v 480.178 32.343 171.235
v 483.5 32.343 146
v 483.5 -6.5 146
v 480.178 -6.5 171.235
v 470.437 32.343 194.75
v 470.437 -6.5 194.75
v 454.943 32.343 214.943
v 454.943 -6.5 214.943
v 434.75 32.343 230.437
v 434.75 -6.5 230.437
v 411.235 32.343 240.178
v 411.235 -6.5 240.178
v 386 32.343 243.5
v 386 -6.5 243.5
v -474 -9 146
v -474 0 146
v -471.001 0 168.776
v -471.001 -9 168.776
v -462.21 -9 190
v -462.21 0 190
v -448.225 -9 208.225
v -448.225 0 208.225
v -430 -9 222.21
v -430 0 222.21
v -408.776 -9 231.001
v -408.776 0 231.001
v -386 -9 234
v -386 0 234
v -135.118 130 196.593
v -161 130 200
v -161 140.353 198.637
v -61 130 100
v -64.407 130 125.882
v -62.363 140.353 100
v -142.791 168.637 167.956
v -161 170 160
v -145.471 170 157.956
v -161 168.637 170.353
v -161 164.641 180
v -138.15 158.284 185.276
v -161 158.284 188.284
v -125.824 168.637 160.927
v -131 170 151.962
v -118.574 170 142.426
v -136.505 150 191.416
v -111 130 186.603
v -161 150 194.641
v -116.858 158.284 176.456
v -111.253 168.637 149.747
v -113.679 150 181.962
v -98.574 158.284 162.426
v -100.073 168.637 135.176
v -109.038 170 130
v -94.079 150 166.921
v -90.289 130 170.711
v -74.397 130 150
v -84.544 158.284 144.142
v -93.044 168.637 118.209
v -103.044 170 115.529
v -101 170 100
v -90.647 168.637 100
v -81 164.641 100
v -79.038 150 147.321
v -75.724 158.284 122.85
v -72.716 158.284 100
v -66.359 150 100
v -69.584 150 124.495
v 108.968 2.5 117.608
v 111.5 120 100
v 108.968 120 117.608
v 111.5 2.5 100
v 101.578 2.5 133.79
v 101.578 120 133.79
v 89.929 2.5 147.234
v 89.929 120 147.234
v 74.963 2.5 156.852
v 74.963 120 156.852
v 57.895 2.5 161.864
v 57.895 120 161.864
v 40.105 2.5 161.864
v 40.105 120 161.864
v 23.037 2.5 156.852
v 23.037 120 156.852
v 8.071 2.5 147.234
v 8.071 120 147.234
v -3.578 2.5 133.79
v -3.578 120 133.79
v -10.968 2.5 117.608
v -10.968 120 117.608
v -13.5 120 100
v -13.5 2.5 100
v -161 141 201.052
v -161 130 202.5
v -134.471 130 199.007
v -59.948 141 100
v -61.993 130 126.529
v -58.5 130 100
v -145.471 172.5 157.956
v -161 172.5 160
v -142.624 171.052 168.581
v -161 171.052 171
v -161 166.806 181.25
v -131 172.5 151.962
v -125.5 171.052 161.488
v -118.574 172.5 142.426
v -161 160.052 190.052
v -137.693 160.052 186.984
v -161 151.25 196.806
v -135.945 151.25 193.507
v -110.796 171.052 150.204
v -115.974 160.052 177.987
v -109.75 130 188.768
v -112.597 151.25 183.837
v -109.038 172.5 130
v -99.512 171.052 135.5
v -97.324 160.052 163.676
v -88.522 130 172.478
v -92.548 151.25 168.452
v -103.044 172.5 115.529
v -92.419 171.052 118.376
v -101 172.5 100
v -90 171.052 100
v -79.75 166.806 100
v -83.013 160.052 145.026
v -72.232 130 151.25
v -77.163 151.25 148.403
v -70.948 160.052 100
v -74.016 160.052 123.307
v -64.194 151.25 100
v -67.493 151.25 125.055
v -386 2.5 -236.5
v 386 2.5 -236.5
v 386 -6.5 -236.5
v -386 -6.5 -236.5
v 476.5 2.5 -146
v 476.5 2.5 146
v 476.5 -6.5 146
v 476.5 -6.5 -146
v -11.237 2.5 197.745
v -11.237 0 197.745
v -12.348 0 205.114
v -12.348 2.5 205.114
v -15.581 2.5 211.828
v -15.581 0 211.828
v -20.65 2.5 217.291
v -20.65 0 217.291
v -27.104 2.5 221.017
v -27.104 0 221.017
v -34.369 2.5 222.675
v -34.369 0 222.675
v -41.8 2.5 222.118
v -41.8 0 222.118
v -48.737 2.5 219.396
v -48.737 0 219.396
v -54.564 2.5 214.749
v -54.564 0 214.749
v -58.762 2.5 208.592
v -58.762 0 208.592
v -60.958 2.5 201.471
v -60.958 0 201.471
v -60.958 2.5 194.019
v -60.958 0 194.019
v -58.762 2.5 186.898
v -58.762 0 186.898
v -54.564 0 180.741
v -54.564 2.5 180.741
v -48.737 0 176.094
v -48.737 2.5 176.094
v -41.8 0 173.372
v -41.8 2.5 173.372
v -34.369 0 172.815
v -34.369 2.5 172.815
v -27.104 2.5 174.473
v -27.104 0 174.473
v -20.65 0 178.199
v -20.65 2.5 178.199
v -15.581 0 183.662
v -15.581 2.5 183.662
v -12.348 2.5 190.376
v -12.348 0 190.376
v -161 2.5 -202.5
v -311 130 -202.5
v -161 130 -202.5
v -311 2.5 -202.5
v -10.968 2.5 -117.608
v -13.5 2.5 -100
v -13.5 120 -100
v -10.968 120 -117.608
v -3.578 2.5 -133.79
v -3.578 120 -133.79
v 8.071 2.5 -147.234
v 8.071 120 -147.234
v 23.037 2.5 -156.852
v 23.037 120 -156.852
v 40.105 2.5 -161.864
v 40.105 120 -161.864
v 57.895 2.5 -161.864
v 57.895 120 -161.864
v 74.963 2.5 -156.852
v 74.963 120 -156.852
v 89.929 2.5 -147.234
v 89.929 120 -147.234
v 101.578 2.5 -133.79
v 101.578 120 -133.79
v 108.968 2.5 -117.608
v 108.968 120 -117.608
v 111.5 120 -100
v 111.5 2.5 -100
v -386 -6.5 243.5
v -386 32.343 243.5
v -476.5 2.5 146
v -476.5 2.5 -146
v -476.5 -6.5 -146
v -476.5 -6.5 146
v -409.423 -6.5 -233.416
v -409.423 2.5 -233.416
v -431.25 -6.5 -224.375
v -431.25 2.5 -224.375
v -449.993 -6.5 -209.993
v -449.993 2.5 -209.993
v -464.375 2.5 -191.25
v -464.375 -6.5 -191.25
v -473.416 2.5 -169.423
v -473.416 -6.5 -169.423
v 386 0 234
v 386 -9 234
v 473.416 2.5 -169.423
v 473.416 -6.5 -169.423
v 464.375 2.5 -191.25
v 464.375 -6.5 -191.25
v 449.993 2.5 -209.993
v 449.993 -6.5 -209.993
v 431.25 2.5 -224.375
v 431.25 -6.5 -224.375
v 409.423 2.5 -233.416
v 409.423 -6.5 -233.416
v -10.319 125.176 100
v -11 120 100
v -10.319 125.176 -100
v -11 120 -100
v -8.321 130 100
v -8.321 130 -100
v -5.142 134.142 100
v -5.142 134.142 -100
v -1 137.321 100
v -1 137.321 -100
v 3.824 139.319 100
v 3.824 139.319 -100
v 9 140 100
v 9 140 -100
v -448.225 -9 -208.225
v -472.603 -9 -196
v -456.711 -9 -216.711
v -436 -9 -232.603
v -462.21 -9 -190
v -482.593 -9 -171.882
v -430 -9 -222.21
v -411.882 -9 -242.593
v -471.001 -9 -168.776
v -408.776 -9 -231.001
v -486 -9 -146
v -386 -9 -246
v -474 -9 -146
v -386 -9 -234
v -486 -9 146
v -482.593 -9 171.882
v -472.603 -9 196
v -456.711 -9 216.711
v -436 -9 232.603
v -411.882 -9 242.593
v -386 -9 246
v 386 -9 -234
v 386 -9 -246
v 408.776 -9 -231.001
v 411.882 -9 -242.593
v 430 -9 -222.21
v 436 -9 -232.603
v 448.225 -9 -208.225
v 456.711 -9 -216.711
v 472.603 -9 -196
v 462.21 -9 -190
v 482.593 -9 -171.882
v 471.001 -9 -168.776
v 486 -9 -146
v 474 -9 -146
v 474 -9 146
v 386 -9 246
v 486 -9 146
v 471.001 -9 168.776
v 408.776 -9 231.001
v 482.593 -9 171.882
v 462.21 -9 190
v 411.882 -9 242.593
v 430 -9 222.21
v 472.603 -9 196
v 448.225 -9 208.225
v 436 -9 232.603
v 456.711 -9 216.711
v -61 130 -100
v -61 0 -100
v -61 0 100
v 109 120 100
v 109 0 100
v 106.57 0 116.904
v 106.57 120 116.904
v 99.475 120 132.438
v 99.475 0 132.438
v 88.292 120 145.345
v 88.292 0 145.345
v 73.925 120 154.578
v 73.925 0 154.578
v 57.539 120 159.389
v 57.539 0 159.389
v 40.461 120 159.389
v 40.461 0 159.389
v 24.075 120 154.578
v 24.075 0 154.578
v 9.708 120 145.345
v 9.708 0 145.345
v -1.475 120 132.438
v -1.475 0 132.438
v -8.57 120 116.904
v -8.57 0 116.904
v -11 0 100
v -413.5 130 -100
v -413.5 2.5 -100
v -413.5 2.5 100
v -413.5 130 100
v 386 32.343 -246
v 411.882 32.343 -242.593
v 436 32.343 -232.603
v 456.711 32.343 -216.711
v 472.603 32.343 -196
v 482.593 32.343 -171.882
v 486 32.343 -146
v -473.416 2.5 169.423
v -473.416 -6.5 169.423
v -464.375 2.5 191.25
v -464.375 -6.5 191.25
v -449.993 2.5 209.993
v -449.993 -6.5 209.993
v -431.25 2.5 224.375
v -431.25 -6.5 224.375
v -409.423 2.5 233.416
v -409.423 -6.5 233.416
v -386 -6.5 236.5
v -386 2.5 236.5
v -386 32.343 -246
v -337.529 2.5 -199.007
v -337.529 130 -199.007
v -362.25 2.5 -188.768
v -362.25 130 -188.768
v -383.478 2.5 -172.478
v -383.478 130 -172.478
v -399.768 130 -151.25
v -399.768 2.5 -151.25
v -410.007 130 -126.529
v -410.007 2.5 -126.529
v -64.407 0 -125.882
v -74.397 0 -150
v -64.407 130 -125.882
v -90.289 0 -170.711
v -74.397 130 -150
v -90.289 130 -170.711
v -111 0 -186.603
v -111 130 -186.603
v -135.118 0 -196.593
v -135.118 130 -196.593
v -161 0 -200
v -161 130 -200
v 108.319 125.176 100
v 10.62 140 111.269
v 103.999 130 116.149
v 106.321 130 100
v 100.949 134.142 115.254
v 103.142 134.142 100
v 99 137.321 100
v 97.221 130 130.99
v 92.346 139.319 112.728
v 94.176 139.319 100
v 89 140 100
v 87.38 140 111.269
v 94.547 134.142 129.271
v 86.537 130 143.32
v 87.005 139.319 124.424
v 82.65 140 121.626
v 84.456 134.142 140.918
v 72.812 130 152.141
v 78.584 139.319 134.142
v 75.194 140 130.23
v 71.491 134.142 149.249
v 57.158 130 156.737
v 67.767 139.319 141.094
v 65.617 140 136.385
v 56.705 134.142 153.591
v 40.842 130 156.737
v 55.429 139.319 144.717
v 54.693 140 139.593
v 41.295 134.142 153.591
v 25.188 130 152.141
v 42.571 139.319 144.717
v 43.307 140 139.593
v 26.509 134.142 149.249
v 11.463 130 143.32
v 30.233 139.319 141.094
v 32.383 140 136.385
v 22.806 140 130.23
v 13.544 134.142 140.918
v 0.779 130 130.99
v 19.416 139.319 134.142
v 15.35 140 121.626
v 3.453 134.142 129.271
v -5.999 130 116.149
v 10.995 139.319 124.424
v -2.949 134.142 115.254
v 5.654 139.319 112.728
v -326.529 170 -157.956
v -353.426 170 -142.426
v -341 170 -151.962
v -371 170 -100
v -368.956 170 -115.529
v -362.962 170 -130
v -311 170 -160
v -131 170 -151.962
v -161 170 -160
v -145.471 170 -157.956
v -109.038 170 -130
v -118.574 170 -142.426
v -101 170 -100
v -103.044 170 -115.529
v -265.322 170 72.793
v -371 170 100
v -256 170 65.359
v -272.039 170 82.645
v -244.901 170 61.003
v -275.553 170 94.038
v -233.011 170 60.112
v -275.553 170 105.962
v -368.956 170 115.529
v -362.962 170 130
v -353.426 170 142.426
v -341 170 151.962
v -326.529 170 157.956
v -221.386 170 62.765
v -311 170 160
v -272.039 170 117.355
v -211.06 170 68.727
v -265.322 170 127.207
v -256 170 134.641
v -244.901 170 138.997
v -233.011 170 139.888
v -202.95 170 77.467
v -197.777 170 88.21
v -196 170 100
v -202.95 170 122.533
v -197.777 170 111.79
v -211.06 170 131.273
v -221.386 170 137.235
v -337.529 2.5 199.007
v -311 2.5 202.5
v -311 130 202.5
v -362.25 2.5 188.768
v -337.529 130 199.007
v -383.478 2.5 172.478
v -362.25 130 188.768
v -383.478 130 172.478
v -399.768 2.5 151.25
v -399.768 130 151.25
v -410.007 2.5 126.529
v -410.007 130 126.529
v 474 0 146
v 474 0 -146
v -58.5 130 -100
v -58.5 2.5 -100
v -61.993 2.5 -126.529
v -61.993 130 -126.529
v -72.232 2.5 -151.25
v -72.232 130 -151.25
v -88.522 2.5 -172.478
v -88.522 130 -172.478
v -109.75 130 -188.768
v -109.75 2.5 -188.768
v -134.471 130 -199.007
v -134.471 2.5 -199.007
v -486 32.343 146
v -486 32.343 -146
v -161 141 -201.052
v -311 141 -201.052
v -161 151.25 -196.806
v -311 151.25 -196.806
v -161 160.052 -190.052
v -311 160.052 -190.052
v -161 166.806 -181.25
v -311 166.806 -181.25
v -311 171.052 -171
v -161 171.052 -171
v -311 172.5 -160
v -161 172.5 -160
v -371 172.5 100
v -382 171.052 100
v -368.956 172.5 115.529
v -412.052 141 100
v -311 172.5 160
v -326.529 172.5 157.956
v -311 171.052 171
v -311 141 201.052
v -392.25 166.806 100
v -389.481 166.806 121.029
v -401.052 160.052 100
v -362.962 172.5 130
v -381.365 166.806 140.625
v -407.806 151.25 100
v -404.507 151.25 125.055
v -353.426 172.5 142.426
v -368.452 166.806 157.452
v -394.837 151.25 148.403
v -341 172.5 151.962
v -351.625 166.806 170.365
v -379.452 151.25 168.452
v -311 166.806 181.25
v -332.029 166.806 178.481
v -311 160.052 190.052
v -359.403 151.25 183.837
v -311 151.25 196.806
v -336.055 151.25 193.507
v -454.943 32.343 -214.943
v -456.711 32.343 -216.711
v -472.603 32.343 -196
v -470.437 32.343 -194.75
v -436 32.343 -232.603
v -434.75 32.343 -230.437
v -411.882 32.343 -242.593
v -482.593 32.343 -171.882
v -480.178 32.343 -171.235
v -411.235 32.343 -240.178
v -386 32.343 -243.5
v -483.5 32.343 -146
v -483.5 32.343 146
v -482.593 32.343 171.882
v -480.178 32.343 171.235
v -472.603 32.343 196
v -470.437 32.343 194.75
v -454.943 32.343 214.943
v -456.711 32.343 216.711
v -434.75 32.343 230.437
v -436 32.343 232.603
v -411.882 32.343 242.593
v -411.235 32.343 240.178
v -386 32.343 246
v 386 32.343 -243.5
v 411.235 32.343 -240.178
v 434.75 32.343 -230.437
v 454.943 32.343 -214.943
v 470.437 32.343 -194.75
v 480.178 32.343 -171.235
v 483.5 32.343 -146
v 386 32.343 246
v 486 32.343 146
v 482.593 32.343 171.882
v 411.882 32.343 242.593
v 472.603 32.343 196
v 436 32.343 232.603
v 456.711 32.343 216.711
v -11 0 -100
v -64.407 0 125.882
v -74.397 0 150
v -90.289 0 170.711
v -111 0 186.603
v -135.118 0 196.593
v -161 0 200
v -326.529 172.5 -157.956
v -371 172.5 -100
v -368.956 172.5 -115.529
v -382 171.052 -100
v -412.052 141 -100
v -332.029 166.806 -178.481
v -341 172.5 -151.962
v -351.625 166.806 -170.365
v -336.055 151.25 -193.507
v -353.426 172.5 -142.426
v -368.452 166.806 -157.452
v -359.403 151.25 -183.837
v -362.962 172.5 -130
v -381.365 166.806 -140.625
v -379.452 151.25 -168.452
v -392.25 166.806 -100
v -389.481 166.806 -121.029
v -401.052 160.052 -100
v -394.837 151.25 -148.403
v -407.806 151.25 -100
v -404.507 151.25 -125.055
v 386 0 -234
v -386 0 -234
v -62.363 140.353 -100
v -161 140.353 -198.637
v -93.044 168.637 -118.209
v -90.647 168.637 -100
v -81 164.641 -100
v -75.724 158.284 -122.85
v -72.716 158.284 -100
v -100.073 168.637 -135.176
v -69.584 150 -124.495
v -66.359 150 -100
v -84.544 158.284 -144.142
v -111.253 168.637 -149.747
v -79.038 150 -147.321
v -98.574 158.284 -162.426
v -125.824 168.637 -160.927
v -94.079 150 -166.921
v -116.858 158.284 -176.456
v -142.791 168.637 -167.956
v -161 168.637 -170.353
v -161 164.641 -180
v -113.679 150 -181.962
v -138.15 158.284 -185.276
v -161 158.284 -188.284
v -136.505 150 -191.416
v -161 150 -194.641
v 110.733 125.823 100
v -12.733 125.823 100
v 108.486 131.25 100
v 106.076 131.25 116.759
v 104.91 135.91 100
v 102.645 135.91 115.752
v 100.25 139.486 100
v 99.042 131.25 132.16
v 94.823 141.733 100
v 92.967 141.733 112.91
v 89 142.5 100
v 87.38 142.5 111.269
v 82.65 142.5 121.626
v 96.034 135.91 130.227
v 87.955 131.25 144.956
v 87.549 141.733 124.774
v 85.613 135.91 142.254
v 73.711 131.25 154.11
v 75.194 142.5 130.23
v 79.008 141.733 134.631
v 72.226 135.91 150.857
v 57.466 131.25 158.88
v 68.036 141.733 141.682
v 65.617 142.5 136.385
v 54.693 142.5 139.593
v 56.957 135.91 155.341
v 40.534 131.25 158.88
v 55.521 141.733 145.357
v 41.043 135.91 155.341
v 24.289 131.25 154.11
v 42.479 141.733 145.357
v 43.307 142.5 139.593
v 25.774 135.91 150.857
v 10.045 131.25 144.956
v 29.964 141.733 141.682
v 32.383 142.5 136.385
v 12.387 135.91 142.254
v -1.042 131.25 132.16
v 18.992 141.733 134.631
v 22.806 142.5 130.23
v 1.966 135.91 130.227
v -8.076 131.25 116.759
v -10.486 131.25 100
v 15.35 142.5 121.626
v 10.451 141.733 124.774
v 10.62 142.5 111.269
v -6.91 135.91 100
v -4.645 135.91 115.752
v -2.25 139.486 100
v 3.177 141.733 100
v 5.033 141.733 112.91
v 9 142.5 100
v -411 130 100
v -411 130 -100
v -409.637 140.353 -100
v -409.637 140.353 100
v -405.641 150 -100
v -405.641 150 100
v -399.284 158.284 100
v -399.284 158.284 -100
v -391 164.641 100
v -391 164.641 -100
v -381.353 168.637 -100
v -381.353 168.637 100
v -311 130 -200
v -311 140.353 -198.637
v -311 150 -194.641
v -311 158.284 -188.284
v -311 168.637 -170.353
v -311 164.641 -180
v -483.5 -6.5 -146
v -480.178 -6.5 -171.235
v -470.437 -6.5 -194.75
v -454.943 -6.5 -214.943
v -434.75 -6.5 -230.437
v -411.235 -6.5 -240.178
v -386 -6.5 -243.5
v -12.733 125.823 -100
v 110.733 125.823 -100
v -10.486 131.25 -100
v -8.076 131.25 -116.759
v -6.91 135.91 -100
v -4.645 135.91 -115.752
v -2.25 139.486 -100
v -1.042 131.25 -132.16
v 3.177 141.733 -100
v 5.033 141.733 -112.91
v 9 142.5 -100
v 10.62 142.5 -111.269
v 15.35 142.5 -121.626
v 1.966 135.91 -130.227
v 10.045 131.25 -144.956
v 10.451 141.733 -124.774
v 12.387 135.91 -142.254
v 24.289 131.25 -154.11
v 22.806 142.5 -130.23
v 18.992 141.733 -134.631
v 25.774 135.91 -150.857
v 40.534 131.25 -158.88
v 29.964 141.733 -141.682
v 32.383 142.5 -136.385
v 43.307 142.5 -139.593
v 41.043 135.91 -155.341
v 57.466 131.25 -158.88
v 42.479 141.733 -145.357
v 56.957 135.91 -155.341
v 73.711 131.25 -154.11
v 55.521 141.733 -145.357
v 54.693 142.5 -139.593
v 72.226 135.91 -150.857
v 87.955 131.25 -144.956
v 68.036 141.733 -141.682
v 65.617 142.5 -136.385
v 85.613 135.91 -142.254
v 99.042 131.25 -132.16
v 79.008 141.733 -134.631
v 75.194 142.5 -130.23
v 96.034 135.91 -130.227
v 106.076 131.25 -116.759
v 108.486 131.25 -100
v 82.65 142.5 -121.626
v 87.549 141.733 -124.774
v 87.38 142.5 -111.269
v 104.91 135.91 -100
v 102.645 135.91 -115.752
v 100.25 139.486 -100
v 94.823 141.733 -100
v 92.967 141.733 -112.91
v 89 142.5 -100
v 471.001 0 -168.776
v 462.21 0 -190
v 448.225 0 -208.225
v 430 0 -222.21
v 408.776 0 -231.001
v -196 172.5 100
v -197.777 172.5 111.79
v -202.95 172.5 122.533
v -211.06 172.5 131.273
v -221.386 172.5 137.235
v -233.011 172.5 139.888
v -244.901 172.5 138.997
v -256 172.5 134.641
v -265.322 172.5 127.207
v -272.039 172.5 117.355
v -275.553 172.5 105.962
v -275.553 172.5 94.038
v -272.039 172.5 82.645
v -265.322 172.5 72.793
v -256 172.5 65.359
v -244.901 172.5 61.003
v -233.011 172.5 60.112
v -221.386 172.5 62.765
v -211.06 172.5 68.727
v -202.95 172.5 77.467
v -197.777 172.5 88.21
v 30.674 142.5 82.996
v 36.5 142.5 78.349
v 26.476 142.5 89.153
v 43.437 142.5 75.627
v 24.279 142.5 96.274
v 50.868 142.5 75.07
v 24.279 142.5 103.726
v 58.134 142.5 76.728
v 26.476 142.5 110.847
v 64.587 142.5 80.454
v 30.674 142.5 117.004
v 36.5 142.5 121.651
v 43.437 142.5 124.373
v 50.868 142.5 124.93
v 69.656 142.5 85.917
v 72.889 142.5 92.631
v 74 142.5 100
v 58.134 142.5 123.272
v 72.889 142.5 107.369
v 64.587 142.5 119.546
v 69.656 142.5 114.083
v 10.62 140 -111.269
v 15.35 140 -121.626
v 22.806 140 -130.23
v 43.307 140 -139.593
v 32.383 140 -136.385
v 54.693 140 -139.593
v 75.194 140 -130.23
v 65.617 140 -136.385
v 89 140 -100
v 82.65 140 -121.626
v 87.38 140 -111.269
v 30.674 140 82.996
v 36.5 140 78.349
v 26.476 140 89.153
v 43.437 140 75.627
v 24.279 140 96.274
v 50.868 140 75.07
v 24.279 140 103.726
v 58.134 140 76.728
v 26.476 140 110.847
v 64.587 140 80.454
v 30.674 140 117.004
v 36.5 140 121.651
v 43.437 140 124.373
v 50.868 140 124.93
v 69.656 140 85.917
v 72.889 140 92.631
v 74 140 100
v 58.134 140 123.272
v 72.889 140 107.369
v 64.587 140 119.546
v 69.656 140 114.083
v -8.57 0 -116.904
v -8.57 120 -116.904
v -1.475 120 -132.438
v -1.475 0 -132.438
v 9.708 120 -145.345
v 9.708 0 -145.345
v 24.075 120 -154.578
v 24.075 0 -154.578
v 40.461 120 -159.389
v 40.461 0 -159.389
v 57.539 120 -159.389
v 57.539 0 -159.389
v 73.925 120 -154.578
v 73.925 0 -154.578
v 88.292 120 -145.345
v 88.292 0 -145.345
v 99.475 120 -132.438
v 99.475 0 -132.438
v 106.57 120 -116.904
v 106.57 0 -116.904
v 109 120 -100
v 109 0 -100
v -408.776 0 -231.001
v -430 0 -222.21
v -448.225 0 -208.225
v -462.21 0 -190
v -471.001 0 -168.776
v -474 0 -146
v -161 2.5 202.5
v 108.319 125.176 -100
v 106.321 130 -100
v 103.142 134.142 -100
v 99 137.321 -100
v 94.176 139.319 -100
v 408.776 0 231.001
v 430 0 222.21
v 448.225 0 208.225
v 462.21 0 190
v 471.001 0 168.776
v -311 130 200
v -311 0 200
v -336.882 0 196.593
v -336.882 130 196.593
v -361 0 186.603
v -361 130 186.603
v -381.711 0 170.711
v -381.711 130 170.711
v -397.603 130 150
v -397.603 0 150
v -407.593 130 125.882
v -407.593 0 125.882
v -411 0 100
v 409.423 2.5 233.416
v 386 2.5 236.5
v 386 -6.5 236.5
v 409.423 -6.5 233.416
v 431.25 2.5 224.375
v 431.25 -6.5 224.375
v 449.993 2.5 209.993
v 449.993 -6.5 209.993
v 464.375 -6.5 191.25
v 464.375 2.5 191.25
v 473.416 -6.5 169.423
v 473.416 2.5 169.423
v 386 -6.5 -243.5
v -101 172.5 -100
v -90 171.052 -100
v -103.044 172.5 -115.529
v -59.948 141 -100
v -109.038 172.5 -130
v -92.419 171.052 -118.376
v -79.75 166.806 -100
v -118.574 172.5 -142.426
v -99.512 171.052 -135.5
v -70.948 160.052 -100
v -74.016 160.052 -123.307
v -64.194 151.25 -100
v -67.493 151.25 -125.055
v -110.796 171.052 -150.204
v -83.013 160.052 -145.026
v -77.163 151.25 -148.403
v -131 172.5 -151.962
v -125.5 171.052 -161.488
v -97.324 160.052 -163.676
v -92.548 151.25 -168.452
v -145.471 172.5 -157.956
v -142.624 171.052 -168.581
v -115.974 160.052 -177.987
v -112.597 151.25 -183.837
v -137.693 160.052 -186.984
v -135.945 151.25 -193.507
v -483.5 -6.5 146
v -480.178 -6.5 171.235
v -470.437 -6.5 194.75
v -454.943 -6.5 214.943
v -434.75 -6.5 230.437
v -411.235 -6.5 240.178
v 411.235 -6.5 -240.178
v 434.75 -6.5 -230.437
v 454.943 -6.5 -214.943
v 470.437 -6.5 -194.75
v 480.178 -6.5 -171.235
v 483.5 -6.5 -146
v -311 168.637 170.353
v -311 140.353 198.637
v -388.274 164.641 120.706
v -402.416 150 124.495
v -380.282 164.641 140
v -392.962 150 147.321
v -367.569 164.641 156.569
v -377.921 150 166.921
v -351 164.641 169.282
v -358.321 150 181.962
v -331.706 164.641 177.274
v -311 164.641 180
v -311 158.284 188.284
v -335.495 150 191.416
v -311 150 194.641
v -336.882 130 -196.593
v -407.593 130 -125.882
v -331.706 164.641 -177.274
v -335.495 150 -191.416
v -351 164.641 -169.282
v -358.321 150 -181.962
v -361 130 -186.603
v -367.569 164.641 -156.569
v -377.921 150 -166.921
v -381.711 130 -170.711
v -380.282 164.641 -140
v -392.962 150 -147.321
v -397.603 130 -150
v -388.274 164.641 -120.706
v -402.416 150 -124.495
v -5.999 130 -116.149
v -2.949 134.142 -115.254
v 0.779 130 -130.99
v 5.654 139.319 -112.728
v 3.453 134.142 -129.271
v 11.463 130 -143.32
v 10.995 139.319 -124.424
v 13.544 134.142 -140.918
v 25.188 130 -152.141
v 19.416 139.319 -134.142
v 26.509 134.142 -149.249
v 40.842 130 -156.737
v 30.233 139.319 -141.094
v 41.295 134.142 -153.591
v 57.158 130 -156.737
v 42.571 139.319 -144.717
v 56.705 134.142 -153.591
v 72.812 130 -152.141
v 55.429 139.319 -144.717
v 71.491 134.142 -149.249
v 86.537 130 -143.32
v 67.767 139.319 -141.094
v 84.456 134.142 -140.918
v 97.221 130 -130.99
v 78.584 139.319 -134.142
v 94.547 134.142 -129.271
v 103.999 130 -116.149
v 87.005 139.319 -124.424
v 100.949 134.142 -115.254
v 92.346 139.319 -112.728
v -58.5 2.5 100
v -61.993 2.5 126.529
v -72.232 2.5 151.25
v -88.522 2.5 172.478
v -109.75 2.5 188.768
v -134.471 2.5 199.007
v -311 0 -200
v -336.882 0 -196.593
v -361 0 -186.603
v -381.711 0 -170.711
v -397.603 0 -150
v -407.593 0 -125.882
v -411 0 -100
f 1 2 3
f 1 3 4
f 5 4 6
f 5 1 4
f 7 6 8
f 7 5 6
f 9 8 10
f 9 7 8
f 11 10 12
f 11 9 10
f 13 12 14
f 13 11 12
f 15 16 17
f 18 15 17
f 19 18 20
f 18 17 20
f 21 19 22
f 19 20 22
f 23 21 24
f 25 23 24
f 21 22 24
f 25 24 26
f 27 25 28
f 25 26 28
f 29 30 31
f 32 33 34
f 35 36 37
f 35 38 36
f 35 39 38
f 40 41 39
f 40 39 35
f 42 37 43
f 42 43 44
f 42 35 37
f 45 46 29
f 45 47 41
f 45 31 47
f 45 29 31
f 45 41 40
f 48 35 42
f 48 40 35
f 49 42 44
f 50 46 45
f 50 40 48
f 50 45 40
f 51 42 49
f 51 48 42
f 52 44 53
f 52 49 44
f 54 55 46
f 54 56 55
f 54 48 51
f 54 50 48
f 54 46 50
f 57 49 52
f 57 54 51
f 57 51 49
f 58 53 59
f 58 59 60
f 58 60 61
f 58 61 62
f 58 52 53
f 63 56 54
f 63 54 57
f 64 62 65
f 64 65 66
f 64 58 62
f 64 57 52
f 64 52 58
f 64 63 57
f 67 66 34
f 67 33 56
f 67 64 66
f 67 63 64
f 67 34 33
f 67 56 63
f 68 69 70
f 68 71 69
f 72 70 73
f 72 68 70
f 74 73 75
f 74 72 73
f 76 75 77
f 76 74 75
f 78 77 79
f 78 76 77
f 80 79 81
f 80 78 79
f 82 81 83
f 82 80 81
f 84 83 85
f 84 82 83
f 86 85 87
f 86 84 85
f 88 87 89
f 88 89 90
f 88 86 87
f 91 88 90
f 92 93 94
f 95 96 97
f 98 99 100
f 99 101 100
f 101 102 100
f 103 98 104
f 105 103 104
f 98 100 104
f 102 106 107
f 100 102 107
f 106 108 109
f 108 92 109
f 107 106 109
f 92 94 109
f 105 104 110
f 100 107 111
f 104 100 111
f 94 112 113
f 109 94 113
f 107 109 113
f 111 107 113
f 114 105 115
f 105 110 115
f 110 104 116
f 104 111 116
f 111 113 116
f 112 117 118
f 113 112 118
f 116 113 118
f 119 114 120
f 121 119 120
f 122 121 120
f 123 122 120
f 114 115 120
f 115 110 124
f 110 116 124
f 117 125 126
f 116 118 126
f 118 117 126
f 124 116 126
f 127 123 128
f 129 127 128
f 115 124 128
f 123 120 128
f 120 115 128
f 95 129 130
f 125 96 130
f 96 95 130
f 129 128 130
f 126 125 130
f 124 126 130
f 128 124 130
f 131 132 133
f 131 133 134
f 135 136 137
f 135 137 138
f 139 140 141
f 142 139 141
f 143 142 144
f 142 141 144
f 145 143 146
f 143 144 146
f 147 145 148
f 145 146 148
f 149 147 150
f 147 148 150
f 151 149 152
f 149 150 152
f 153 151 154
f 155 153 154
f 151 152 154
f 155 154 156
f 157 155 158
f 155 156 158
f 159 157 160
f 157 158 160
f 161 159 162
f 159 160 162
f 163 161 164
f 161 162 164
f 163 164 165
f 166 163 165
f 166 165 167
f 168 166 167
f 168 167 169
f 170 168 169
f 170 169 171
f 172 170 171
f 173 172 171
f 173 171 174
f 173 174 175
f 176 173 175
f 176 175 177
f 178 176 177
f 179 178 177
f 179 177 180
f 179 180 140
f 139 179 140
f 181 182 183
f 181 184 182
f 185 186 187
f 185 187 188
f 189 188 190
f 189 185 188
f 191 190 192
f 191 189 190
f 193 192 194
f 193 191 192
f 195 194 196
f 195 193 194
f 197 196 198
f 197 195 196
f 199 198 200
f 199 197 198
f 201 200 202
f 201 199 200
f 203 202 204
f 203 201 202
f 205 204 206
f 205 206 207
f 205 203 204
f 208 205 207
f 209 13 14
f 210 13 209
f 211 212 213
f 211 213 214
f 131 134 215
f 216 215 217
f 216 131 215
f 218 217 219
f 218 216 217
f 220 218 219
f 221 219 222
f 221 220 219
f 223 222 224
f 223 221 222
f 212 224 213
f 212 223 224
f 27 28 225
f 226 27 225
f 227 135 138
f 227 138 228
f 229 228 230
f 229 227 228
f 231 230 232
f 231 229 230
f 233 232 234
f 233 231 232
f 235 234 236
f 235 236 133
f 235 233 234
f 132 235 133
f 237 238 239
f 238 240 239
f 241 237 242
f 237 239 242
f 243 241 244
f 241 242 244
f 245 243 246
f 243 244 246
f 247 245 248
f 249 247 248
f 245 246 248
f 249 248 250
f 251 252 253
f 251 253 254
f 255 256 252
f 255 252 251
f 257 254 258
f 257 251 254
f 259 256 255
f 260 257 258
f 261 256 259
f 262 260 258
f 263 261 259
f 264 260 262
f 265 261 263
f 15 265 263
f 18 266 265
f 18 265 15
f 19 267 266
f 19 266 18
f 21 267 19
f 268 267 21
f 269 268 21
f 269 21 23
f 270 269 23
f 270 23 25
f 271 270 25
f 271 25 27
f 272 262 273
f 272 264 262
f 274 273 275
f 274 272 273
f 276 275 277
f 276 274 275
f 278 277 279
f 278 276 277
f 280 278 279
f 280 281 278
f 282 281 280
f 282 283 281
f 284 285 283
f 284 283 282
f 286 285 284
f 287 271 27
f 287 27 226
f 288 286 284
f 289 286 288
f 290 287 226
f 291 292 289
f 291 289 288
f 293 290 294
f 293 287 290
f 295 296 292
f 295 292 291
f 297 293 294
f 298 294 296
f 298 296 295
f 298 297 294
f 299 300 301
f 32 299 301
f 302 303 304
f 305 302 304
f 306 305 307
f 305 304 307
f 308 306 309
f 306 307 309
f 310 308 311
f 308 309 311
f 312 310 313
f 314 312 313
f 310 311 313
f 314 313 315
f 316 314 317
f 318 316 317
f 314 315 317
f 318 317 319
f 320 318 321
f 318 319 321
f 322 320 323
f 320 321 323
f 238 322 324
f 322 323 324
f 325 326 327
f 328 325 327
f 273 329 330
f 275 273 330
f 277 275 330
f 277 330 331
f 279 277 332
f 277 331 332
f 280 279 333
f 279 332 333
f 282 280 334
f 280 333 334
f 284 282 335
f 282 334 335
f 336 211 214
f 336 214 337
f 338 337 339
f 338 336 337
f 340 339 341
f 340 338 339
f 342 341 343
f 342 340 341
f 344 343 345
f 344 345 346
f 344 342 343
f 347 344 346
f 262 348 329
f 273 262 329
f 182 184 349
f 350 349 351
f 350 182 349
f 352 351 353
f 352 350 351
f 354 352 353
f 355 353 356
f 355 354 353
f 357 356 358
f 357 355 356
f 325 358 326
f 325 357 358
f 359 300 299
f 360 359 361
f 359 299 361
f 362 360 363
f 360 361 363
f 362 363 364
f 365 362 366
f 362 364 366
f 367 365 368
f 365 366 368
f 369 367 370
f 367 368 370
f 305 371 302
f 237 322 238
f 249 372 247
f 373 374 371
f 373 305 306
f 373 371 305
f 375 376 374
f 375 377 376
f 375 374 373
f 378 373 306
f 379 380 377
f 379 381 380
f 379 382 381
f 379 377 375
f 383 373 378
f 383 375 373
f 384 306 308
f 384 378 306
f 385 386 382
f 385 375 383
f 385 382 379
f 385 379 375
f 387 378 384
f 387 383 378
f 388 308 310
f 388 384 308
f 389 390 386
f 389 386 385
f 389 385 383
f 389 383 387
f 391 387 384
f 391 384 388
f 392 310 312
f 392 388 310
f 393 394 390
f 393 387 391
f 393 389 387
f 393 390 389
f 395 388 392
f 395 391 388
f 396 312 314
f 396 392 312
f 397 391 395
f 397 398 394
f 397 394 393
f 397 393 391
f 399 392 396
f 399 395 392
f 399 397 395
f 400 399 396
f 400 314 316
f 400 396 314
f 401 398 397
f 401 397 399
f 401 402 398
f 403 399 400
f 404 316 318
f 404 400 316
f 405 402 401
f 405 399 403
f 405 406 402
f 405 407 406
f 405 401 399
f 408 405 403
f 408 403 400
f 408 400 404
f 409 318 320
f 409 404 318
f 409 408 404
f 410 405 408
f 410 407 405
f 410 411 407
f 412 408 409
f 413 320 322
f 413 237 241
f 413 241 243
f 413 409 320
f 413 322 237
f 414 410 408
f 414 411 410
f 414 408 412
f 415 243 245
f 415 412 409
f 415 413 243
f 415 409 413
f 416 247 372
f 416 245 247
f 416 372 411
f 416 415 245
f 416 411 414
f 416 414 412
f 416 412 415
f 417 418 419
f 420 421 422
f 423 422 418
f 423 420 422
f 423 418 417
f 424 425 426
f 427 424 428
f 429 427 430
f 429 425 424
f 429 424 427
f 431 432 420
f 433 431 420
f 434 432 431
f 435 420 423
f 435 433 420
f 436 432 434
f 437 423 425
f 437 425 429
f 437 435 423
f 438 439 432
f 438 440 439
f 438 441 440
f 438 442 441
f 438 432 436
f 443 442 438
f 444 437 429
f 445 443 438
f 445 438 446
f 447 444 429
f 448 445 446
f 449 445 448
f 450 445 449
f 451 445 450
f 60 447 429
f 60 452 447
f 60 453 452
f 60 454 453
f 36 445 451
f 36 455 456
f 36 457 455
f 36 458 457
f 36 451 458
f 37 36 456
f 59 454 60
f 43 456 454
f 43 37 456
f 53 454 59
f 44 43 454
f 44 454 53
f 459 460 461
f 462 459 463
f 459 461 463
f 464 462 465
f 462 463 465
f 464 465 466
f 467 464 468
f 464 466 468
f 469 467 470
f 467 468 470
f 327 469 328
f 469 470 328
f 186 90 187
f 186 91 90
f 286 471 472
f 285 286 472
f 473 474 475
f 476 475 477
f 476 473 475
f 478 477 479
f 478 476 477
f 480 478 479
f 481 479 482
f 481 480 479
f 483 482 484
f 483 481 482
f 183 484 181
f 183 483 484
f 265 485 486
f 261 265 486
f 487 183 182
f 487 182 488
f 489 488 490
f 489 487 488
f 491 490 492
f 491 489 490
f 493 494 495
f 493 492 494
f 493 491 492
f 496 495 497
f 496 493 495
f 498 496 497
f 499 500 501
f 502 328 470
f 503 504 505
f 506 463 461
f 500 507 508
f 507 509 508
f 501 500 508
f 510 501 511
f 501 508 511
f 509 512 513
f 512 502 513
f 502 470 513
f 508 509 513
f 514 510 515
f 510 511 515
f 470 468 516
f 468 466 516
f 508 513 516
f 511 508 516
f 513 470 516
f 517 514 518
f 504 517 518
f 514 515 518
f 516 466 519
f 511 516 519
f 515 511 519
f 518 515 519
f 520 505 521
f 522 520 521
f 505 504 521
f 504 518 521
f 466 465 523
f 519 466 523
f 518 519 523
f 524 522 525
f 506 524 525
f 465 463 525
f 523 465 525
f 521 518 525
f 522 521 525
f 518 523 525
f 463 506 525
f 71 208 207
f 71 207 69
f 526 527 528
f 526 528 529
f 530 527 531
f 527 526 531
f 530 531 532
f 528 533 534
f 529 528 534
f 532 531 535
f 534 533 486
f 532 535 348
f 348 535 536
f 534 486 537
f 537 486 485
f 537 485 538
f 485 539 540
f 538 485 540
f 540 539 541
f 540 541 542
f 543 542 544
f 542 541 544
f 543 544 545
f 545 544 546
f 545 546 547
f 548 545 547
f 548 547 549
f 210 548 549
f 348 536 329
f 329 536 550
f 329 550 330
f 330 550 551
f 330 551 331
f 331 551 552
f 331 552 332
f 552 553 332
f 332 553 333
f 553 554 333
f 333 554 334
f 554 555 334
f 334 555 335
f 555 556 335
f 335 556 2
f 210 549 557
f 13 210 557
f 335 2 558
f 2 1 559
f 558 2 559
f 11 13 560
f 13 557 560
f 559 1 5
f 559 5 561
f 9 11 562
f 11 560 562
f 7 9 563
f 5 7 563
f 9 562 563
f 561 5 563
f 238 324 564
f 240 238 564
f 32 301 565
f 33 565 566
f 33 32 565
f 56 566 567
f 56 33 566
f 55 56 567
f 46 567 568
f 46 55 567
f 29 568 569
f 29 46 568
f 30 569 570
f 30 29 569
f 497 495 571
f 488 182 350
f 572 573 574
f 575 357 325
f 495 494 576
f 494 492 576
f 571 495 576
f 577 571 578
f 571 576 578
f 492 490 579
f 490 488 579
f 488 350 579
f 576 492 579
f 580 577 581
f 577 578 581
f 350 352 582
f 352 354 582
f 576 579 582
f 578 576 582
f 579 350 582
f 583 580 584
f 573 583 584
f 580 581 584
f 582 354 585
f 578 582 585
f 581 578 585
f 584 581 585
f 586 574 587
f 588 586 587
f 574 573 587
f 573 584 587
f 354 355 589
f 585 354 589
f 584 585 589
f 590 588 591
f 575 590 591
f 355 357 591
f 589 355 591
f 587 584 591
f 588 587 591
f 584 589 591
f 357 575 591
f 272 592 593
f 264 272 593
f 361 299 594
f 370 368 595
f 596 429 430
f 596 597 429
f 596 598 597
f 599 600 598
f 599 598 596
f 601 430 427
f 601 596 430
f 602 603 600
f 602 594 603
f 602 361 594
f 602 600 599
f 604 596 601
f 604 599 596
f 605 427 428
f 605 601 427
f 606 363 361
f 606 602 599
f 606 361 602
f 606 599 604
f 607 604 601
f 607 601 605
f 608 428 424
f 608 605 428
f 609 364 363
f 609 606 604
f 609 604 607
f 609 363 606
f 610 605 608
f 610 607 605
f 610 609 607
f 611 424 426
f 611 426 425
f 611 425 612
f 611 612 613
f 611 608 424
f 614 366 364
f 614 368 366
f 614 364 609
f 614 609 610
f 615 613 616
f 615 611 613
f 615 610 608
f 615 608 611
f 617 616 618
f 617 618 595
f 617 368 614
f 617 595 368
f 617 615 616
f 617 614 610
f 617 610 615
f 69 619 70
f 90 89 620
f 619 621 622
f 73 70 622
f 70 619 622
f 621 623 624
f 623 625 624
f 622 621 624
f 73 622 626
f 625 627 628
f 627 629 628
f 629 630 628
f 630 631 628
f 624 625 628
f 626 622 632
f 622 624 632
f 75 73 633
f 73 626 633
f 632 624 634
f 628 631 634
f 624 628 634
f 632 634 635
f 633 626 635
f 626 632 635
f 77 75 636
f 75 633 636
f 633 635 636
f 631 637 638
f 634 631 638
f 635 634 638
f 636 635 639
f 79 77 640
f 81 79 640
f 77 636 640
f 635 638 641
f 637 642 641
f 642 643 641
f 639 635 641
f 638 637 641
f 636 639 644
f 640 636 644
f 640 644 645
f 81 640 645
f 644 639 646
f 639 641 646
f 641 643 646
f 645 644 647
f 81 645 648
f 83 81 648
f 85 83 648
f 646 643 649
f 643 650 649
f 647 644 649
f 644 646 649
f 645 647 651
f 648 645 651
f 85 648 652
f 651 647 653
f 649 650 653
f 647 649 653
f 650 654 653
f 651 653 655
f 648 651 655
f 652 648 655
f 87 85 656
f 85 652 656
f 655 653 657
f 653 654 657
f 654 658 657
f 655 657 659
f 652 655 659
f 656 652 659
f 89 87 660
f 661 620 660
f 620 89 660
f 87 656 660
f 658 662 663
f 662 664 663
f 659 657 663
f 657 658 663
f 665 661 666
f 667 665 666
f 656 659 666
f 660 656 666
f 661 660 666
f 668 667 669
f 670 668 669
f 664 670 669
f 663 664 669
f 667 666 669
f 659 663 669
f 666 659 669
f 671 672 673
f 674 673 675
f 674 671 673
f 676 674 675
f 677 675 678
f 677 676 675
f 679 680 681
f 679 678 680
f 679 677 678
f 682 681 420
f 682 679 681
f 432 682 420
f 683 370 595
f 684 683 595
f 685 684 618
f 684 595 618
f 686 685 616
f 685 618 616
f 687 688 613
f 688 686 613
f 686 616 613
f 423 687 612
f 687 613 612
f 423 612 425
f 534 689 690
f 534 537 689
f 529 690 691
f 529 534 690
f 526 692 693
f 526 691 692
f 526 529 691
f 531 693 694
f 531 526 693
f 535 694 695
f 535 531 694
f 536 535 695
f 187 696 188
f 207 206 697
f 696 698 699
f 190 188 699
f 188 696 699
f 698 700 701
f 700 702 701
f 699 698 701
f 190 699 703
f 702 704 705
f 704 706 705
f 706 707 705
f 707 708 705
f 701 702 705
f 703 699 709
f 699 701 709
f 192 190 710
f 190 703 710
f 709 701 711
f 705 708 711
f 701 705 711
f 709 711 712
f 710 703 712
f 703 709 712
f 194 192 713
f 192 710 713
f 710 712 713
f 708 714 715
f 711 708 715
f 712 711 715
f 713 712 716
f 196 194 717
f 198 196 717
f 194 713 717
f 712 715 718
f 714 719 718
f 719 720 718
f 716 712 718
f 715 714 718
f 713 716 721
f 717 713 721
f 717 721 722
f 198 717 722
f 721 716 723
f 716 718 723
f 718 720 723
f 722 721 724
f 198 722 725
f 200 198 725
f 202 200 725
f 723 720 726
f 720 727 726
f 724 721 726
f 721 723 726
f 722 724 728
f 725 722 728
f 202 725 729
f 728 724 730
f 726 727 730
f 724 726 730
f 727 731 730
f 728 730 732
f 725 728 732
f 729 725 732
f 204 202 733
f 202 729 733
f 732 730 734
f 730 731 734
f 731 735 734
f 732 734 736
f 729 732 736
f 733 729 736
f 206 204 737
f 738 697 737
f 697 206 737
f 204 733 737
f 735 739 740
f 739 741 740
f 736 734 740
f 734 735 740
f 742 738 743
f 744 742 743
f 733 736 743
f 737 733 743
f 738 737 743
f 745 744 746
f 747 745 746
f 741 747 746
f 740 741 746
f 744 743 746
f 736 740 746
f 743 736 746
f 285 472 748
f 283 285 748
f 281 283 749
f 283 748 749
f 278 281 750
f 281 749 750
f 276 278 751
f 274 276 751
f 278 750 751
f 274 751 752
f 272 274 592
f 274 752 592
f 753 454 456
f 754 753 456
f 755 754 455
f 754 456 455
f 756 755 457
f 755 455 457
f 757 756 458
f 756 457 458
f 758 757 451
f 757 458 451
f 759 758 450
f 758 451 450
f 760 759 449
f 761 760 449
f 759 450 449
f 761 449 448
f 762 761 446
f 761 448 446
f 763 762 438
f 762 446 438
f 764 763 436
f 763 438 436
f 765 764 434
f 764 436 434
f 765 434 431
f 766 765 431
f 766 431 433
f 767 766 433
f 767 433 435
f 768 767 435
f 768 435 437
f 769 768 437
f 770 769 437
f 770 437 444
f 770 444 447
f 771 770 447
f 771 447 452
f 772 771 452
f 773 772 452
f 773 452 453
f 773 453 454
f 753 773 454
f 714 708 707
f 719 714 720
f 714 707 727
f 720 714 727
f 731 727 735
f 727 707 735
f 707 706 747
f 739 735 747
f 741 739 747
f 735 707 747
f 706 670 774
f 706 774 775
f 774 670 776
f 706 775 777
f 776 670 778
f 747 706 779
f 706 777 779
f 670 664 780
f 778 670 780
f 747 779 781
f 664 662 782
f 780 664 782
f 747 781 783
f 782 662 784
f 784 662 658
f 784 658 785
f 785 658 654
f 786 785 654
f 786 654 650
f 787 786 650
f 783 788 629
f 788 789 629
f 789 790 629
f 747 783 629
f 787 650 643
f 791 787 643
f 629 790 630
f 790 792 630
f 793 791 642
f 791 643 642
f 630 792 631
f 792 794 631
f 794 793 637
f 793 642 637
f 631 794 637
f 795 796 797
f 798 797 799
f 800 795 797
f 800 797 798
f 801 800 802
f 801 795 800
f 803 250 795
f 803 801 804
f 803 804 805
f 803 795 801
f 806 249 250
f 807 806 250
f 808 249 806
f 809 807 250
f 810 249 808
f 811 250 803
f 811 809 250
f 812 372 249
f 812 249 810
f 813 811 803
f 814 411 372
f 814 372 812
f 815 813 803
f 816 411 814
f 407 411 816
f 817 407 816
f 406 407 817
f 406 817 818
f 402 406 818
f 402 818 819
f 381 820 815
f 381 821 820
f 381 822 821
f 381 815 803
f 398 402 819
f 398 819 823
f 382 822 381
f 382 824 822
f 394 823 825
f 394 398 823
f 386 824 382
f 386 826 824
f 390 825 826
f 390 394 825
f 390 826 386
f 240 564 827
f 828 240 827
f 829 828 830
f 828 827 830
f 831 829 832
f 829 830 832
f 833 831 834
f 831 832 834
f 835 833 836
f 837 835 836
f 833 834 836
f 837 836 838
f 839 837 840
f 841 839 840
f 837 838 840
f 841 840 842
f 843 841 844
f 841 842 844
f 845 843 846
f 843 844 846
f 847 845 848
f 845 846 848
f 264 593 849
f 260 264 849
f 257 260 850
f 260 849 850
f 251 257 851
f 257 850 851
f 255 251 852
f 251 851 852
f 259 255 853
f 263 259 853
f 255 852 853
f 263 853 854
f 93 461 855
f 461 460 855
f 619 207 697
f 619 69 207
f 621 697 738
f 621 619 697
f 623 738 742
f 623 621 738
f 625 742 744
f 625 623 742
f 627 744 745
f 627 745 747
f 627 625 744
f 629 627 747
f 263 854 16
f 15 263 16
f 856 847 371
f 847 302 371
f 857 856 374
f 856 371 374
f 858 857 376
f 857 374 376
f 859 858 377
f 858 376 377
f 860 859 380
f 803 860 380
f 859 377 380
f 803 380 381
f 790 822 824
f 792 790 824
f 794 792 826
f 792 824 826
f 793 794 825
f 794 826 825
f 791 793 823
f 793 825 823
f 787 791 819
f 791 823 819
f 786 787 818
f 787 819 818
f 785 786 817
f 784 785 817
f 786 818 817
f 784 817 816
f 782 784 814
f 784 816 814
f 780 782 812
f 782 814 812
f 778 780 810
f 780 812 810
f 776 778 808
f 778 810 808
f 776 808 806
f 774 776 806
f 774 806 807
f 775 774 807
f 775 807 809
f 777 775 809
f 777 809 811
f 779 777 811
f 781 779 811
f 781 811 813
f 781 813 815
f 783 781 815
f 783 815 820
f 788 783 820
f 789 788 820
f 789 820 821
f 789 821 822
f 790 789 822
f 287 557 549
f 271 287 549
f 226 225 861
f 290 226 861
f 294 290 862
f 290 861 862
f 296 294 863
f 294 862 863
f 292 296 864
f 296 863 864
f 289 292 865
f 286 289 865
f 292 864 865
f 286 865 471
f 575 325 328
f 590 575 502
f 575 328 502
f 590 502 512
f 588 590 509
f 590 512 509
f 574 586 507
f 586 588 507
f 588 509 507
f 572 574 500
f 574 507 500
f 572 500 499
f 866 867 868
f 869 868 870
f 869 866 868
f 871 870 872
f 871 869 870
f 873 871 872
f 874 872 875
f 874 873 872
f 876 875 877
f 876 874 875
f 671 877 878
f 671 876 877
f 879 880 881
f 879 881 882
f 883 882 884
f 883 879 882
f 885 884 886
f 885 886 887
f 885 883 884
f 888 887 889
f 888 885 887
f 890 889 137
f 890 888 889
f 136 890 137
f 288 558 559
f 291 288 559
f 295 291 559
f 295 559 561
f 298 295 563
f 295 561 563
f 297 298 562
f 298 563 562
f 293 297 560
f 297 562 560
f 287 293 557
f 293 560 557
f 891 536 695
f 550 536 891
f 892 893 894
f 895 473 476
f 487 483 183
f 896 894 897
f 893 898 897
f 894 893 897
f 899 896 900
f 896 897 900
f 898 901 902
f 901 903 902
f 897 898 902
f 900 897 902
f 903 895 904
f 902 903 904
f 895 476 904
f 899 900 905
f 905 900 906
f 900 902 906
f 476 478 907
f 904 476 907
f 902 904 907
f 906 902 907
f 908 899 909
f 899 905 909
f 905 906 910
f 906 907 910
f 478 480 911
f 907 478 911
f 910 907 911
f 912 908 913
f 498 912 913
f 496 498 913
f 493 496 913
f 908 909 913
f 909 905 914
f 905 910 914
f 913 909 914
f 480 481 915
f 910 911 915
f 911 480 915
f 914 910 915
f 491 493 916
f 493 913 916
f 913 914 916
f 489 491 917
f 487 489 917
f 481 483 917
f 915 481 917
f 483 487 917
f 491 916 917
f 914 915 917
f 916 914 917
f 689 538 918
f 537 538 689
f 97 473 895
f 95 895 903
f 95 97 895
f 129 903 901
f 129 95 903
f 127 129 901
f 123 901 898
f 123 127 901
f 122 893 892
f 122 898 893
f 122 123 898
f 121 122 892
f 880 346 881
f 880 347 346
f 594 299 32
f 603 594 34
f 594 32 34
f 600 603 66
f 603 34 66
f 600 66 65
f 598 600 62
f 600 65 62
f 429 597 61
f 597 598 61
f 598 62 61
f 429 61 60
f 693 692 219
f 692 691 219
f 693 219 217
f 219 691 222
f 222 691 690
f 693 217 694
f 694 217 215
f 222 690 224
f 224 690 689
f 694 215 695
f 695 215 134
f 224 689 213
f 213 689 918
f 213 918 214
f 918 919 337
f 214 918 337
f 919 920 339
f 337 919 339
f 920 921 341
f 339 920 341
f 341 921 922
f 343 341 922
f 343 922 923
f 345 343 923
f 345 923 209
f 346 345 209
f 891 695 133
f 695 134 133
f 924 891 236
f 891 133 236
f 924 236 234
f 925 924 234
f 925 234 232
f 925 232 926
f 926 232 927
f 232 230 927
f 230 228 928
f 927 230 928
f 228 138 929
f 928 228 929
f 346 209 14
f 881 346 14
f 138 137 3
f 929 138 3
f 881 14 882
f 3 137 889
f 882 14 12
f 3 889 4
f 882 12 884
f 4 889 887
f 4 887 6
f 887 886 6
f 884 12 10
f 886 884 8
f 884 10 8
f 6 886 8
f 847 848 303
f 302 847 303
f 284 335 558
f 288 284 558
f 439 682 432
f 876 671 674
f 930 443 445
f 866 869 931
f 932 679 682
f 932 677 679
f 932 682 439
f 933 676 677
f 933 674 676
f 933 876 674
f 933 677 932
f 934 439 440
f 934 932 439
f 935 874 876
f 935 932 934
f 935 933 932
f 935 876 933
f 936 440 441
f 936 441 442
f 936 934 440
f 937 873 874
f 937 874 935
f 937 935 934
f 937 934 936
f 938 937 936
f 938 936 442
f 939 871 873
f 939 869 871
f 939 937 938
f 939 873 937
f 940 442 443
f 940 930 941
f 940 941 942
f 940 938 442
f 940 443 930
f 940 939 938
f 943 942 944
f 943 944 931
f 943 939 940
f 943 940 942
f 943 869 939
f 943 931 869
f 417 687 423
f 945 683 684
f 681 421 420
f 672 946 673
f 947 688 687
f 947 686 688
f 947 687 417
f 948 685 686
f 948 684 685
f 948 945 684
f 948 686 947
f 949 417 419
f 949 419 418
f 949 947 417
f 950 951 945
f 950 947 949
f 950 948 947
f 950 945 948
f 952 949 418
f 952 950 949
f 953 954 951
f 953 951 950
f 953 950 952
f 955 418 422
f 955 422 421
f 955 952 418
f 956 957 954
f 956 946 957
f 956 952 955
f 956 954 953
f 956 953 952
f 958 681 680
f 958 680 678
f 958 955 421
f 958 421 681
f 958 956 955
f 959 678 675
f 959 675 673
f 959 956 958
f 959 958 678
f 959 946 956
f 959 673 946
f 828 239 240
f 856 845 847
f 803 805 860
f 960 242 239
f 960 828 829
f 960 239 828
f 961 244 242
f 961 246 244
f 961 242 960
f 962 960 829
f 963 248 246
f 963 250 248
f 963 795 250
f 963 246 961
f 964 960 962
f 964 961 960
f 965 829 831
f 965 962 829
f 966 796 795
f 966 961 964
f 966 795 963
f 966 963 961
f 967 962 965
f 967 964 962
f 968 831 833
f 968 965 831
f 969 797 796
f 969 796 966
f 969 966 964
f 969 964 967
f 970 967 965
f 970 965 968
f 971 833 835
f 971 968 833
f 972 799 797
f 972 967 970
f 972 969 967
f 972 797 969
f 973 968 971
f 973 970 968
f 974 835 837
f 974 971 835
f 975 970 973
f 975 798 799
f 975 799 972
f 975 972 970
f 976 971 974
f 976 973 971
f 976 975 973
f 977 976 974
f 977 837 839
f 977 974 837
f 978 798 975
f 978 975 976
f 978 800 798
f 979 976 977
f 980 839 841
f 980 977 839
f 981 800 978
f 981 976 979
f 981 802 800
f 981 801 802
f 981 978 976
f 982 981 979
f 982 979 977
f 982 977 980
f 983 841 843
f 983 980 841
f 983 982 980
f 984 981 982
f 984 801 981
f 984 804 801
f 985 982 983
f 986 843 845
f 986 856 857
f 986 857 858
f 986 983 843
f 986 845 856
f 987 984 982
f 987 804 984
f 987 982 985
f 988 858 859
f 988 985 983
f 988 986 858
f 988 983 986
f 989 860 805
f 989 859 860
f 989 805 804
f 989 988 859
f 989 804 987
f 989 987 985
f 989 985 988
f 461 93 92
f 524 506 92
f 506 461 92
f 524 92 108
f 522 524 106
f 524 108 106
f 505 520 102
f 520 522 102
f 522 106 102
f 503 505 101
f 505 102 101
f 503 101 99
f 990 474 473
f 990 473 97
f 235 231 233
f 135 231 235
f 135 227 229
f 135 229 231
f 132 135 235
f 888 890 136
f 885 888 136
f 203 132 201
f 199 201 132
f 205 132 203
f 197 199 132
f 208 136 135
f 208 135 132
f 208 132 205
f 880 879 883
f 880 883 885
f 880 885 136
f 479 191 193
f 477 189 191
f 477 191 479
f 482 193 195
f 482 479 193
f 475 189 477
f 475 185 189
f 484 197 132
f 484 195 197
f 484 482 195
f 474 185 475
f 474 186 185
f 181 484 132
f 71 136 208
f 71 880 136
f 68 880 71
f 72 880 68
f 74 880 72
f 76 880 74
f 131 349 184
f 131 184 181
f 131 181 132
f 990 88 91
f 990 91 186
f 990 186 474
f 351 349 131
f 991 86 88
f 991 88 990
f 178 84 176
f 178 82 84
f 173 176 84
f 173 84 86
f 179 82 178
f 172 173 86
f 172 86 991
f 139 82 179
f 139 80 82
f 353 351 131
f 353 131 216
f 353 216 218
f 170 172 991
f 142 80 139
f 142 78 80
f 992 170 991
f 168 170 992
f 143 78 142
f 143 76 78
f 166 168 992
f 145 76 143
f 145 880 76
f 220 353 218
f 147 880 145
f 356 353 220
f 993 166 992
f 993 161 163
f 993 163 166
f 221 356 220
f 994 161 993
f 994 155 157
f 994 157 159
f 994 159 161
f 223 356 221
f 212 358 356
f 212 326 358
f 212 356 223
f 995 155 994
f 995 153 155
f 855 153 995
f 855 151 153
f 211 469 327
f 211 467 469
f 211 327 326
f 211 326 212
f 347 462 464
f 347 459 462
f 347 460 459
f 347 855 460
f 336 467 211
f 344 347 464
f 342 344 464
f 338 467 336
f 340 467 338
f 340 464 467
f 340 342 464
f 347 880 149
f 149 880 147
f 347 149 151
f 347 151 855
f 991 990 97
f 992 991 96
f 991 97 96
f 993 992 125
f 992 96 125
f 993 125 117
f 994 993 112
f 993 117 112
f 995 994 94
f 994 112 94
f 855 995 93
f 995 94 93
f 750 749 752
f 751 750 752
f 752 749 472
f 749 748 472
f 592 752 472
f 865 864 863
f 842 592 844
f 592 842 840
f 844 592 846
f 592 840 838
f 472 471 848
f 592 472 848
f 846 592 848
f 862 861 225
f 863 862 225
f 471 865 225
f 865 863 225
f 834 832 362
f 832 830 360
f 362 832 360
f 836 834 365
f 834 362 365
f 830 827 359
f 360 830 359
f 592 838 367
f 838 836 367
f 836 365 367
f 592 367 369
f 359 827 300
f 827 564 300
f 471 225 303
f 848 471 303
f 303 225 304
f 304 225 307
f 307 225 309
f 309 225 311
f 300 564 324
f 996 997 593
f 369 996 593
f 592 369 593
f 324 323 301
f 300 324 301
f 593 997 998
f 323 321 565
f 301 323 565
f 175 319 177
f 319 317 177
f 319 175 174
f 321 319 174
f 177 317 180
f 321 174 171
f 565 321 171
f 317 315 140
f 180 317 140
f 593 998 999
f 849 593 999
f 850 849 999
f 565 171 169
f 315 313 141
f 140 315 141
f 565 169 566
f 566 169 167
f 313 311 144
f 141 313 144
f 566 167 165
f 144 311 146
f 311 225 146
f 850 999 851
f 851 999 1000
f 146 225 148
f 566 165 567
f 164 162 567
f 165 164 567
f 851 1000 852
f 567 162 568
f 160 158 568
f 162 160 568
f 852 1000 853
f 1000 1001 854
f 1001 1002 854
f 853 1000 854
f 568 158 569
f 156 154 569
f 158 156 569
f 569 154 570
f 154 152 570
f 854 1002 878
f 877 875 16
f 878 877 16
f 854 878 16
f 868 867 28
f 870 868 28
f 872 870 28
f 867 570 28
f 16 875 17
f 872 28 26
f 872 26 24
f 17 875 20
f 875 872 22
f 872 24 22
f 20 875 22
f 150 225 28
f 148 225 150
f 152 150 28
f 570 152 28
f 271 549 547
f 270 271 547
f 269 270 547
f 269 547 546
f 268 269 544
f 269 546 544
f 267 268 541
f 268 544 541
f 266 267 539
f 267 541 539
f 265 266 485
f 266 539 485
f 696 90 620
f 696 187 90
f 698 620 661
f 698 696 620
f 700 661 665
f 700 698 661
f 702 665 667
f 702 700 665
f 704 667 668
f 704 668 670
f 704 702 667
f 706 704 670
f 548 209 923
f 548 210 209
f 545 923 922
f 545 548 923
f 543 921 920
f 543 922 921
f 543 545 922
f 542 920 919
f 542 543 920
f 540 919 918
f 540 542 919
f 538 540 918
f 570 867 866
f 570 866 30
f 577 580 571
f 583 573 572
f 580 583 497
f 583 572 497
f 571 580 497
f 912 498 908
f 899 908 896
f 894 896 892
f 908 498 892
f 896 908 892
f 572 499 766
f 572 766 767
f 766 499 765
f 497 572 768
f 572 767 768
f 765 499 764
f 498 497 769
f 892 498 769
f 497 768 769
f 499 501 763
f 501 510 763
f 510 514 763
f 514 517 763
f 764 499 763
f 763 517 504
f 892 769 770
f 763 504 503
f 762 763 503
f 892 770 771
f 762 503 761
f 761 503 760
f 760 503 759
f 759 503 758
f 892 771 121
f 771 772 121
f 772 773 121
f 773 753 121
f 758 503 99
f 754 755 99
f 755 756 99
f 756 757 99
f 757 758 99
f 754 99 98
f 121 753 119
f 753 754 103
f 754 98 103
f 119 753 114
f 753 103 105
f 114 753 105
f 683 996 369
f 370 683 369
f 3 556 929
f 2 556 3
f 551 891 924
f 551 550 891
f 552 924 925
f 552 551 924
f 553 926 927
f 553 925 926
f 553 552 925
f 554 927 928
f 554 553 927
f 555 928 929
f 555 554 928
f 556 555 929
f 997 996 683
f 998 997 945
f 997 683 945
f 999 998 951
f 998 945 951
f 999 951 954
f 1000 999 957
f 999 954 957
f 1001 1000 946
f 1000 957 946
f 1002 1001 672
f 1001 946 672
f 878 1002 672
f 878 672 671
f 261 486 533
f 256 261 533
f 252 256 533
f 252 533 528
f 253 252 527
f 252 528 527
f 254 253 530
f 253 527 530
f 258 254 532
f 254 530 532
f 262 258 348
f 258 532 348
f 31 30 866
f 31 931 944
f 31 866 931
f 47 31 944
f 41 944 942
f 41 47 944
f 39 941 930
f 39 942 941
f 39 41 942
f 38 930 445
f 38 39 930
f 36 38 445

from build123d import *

# Parameters (mm, degrees)
F1_DEPTH     = 300
F2_W         = 350
F2_H         = 400
F3_DEPTH     = 170
F4_R         = 40
F5_T1_DEPTH  = 170
F5_T4_ANGLE  = 90
F5_T6_ANGLE  = 90
F5_T8_ANGLE  = 90
F5_T10_ANGLE = 90
F7_DEPTH     = 140
F8_R         = 20
F10_DEPTH    = 9
F11_T        = -2.5
F12_DEPTH    = 267.6571849734
F13_R        = 40
F14_DEPTH    = 2.501
F15_R        = 25
F16_DEPTH    = 32.501
F17_R        = 25
F18_DEPTH    = 172.501


# Not quite as in the source:
# - a fillet or chamfer that OpenCascade refuses, or shapes differently, is made with other operations: its cross-section is extruded or revolved along the edge and cut away or added


with BuildPart() as f1:
    # F0 (on Front) → F1 (new body)
    with BuildSketch(Plane.XZ):
        with BuildLine():
            Line((-386, -246), (386, -246))
            ThreePointArc((386, -246), (456.7106781187, -216.7106781187), (486, -146))
            Line((486, -146), (486, 146))
            ThreePointArc((486, 146), (456.7106781187, 216.7106781187), (386, 246))
            Line((386, 246), (-386, 246))
            ThreePointArc((-386, 246), (-456.7106781187, 216.7106781187), (-486, 146))
            Line((-486, 146), (-486, -146))
            ThreePointArc((-486, -146), (-456.7106781187, -216.7106781187), (-386, -246))
        make_face()
    extrude(amount=-F1_DEPTH)

    # F2 (on face) → F3 (cut)
    with BuildSketch(Plane.XZ):
        with Locations((-236, 0)):
            Rectangle(F2_W, F2_H)
    extrude(amount=-F3_DEPTH, mode=Mode.SUBTRACT)

    # F4
    f4_edges = [f1.edges().sort_by_distance(p)[0] for p in [
        (-61, 170, 0),
        (-236, 170, 200),
        (-411, 170, 0),
        (-236, 170, -200),
    ]]
    fillet(f4_edges, radius=F4_R)

    # F5: fillet of radius 100 on 4 edges, made by hand

    # F5_s2 → F5_t1 (join)
    with BuildSketch(Plane.XZ.offset(-170)):
        with BuildLine():
            ThreePointArc((-311, 200), (-381.7106781187, 170.7106781187), (-411, 100))
            Line((-411, 100), (-411, 200))
            Line((-411, 200), (-311, 200))
        make_face()
        with BuildLine():
            ThreePointArc((-311, -200), (-381.7106781187, -170.7106781187), (-411, -100))
            Line((-411, -100), (-411, -200))
            Line((-411, -200), (-311, -200))
        make_face()
        with BuildLine():
            ThreePointArc((-61, 100), (-90.2893218813, 170.7106781187), (-161, 200))
            Line((-161, 200), (-61, 200))
            Line((-61, 200), (-61, 100))
        make_face()
        with BuildLine():
            ThreePointArc((-61, -100), (-90.2893218813, -170.7106781187), (-161, -200))
            Line((-161, -200), (-61, -200))
            Line((-61, -200), (-61, -100))
        make_face()
    extrude(amount=F5_T1_DEPTH)

    # F5_s3 → F5_t4 (revolve)
    with BuildSketch(Plane.XY.offset(-100)):
        with BuildLine():
            ThreePointArc((-101, 170), (-72.7157287525, 158.2842712475), (-61, 130))
            Line((-61, 130), (-61, 170))
            Line((-61, 170), (-101, 170))
        make_face()
    revolve(axis=Axis((-161, 170, -100), (0, 1, 0)), revolution_arc=F5_T4_ANGLE)

    # F5_s5 → F5_t6 (revolve)
    with BuildSketch(Plane.YZ.offset(-161)):
        with BuildLine():
            ThreePointArc((170, 160), (158.2842712475, 188.2842712475), (130, 200))
            Line((130, 200), (170, 200))
            Line((170, 200), (170, 160))
        make_face()
    revolve(axis=Axis((-161, 170, 100), (0, 1, 0)), revolution_arc=F5_T6_ANGLE)

    # F5_s7 → F5_t8 (revolve)
    with BuildSketch(Plane.YZ.offset(-311)):
        with BuildLine():
            ThreePointArc((170, -160), (158.2842712475, -188.2842712475), (130, -200))
            Line((130, -200), (170, -200))
            Line((170, -200), (170, -160))
        make_face()
    revolve(axis=Axis((-311, 170, -100), (0, 1, 0)), revolution_arc=F5_T8_ANGLE)

    # F5_s9 → F5_t10 (revolve)
    with BuildSketch(Plane.XY.offset(100)):
        with BuildLine():
            ThreePointArc((-371, 170), (-399.2842712475, 158.2842712475), (-411, 130))
            Line((-411, 130), (-411, 170))
            Line((-411, 170), (-371, 170))
        make_face()
    revolve(axis=Axis((-311, 170, 100), (0, 1, 0)), revolution_arc=F5_T10_ANGLE)

    # F6 (on face) → F7 (cut)
    with BuildSketch(Plane.XZ):
        with BuildLine():
            ThreePointArc((-11, -100), (49, -160), (109, -100))
            Line((109, -100), (109, 100))
            ThreePointArc((109, 100), (49, 160), (-11, 100))
            Line((-11, 100), (-11, -100))
        make_face()
    extrude(amount=-F7_DEPTH, mode=Mode.SUBTRACT)

    # F8
    f8_edges = [f1.edges().sort_by_distance(p)[0] for p in [
        (49, 140, -160),
        (109, 140, 0),
        (49, 140, 160),
        (-11, 140, 0),
    ]]
    fillet(f8_edges, radius=F8_R)

    # F9 (on face) → F10 (join)
    with BuildSketch(Plane.XZ):
        with BuildLine():
            Line((386, 246), (-386, 246))
            ThreePointArc((-386, 246), (-456.7106781187, 216.7106781187), (-486, 146))
            Line((-486, 146), (-486, -146))
            ThreePointArc((-486, -146), (-456.7106781187, -216.7106781187), (-386, -246))
            Line((-386, -246), (386, -246))
            ThreePointArc((386, -246), (456.7106781187, -216.7106781187), (486, -146))
            Line((486, -146), (486, 146))
            ThreePointArc((486, 146), (456.7106781187, 216.7106781187), (386, 246))
        make_face()
        with BuildLine():
            ThreePointArc((386, 234), (448.2253967444, 208.2253967444), (474, 146))
            Line((474, 146), (474, -146))
            ThreePointArc((474, -146), (448.2253967444, -208.2253967444), (386, -234))
            Line((386, -234), (-386, -234))
            ThreePointArc((-386, -234), (-448.2253967444, -208.2253967444), (-474, -146))
            Line((-474, -146), (-474, 146))
            ThreePointArc((-474, 146), (-448.2253967444, 208.2253967444), (-386, 234))
            Line((-386, 234), (386, 234))
        make_face(mode=Mode.SUBTRACT)
    extrude(amount=F10_DEPTH)

    # F11
    f11_openings = [f1.faces().sort_by_distance(p)[0] for p in [
        (0, 300, 0),
    ]]
    offset(amount=F11_T, openings=f11_openings, kind=Kind.INTERSECTION)

    # F12 (cut): a face of the model
    f12_faces = [f1.faces().sort_by_distance(p)[0] for p in [
        (0, 300, -244.9105744633),
    ]]
    extrude(f12_faces, amount=-F12_DEPTH, mode=Mode.SUBTRACT)

    # F13 (on face) → F14 (cut, through all)
    with BuildSketch(Plane.XZ.offset(-170)):
        with Locations((-236, 100)):
            Circle(F13_R)
    extrude(amount=-F14_DEPTH, mode=Mode.SUBTRACT)

    # F15 (on face) → F16 (cut, through all)
    with BuildSketch(Plane.XZ.offset(-140)):
        with Locations((49, 100)):
            Circle(F15_R)
    extrude(amount=-F16_DEPTH, mode=Mode.SUBTRACT)

    # F17 (on face) → F18 (cut, through all)
    with BuildSketch(Plane.XZ):
        with Locations((-36.2374484539, 197.7449208498)):
            Circle(F17_R)
    extrude(amount=-F18_DEPTH, mode=Mode.SUBTRACT)


solid = f1.part
